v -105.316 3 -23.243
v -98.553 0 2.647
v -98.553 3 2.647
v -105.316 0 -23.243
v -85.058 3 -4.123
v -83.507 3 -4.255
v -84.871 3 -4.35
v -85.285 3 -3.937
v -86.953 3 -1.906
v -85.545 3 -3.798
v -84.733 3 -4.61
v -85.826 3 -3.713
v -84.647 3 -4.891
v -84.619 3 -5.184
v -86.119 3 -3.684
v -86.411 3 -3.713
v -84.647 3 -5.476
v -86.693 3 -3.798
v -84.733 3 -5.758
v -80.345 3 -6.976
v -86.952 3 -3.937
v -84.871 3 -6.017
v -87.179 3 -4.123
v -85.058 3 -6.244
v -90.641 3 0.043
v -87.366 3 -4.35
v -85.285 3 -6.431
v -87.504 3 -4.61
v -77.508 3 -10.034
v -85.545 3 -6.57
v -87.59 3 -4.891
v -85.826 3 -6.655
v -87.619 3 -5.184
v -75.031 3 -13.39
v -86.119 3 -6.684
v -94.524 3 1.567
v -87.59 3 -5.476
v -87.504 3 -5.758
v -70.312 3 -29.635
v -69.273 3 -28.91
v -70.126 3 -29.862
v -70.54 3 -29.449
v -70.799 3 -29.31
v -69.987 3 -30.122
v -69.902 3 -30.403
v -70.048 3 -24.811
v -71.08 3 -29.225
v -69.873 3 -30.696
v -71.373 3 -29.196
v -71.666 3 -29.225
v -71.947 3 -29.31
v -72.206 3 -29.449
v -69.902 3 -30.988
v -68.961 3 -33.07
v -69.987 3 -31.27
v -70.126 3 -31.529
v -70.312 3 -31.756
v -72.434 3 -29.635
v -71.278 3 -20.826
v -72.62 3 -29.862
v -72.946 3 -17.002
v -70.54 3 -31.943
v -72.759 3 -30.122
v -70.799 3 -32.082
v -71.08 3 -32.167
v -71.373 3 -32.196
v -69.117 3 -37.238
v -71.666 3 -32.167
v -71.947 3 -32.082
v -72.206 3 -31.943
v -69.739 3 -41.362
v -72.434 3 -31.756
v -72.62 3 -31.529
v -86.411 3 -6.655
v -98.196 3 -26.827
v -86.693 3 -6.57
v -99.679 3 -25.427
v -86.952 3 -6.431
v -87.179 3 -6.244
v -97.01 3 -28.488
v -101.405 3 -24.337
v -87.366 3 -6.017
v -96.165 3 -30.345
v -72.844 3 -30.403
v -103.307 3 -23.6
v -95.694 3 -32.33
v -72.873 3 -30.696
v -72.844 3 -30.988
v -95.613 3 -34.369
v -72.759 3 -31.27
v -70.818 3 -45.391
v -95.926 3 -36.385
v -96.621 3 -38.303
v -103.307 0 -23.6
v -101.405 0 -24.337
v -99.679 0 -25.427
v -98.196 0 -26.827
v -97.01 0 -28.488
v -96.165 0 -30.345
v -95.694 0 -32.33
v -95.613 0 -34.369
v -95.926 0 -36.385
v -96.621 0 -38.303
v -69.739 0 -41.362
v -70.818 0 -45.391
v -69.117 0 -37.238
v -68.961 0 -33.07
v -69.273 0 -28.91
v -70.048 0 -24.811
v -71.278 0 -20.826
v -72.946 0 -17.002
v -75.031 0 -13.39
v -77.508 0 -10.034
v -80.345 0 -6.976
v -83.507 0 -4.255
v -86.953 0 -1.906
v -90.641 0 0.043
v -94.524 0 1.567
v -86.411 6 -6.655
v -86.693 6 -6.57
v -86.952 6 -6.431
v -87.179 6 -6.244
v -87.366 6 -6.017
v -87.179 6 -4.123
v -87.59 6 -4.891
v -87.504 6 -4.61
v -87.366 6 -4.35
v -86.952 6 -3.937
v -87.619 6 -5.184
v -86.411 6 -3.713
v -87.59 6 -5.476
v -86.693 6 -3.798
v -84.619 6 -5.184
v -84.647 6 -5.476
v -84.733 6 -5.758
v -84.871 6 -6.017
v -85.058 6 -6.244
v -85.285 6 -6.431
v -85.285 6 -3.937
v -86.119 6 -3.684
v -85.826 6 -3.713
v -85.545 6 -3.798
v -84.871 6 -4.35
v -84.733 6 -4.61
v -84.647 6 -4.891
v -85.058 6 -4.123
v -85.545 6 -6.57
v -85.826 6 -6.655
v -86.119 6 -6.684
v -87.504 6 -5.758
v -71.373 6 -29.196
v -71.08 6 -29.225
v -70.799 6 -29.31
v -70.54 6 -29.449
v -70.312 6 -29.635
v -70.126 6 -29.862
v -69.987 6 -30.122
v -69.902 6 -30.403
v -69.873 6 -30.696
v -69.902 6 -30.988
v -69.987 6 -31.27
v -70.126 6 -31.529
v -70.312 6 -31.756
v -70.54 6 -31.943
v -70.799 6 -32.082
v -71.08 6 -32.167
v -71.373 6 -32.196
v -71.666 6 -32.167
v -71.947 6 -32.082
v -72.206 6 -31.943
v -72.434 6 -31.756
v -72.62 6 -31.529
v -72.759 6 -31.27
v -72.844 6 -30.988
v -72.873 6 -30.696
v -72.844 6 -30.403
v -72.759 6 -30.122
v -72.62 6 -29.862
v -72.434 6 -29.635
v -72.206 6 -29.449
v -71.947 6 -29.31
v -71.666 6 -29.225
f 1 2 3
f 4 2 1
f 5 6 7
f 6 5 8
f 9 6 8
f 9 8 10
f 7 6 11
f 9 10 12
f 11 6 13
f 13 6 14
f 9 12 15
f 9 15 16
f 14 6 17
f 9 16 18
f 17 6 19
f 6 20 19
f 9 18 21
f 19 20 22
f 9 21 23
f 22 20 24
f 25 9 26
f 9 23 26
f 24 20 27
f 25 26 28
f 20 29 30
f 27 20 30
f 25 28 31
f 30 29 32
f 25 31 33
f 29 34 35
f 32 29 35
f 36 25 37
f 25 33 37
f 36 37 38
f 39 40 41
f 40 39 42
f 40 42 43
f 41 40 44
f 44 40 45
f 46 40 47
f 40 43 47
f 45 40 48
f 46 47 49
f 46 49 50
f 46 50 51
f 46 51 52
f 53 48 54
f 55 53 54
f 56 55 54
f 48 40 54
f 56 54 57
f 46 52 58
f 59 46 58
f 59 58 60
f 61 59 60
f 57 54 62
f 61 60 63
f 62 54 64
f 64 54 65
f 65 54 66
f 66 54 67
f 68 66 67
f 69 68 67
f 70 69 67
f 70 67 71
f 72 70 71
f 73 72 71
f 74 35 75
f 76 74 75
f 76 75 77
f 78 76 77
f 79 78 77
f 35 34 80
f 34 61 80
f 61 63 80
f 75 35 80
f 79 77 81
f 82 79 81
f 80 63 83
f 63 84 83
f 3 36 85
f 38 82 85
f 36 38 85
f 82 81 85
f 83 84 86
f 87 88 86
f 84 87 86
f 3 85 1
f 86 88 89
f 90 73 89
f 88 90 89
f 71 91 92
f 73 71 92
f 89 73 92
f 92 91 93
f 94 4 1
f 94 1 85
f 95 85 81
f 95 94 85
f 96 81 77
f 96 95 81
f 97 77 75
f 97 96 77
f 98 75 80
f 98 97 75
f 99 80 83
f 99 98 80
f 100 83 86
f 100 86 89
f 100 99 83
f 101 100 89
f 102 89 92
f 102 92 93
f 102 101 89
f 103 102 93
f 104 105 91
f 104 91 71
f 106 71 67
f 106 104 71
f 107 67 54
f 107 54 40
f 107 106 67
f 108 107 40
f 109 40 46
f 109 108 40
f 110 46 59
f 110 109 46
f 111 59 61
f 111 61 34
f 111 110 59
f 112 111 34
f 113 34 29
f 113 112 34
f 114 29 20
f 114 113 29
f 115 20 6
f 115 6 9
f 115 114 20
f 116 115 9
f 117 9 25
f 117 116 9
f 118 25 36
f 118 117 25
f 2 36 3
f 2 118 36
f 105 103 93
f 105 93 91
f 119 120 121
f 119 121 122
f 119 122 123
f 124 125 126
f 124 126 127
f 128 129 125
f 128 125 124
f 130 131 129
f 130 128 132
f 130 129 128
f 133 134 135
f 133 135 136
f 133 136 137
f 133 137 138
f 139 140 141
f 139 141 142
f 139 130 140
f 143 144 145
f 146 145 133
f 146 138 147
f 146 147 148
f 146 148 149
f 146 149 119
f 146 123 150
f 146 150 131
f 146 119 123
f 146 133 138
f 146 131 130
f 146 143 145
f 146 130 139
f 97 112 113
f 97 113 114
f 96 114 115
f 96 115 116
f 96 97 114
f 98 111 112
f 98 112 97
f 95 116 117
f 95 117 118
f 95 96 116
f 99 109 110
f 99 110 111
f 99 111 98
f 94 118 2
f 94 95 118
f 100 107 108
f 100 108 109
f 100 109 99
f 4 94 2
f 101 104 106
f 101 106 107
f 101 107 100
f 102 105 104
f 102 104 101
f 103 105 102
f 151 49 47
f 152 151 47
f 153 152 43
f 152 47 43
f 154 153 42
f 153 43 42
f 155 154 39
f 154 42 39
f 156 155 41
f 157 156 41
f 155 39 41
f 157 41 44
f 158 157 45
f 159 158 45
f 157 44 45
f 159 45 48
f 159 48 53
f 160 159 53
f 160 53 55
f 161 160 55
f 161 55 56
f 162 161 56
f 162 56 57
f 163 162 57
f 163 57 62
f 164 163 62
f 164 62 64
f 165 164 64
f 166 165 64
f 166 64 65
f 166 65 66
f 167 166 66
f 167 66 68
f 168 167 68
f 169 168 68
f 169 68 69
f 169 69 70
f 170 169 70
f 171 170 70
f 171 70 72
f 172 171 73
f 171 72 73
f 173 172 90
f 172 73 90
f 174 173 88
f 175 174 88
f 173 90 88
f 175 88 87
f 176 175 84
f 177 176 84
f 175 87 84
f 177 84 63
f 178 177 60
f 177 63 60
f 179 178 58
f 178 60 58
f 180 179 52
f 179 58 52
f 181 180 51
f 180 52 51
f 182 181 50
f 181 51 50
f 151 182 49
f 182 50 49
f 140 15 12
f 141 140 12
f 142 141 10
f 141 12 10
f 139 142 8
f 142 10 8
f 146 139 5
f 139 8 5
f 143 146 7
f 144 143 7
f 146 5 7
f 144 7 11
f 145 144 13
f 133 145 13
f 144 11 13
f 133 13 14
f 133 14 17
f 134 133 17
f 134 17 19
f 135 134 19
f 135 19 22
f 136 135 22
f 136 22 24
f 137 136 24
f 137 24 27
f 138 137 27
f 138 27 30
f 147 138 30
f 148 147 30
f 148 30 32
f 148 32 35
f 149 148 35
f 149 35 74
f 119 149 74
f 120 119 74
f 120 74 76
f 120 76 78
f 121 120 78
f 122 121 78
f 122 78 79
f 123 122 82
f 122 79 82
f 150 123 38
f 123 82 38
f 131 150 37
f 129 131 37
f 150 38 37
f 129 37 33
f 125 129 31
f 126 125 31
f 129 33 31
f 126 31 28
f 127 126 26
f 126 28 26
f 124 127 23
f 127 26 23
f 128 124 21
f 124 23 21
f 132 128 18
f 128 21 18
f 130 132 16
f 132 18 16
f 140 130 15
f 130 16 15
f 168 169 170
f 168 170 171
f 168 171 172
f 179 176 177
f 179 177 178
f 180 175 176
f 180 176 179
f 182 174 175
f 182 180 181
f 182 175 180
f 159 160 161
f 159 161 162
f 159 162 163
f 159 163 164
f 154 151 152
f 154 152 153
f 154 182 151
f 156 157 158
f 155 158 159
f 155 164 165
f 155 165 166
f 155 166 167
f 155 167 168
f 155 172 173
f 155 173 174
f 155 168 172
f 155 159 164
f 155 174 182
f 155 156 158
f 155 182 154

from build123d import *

# Parameters (mm, degrees)
SKETCH_1_R           = 1.5
EXTRUDE_1_DEPTH      = 3
EXTRUDE_2_DEPTH      = 3
EXTRUDE_2_DEPTH_BACK = 3
SKETCH_2_R           = 1.5


with BuildPart() as part:
    # 草图1 → 凸台-拉伸1 (new body)
    with BuildSketch(Plane(origin=(0, 0, 0), x_dir=(1, 0, 0), z_dir=(0, 1, 0))):
        with BuildLine():
            Line((-96.621430383, 38.303370954), (-70.818390196, 45.39148714))
            ThreePointArc((-70.818390196, 45.39148714), (-73.937652642, 15.166954083), (-98.553234864, -2.646672965))
            Line((-98.553234864, -2.646672965), (-105.316266275, 23.243473425))
            ThreePointArc((-105.316266275, 23.243473425), (-97.009577473, 28.487536095), (-96.621430383, 38.303370954))
        make_face()
        with Locations((-86.118640655, 5.183838281)):
            Circle(SKETCH_1_R, mode=Mode.SUBTRACT)
        with Locations((-71.373114162, 30.69577881)):
            Circle(SKETCH_1_R, mode=Mode.SUBTRACT)
    extrude(amount=EXTRUDE_1_DEPTH)

    # 草图2 → 凸台-拉伸2 (add, two sides: drawn at the far end of the back side and taken through both)
    with BuildSketch(Plane(origin=(0, 3, 0), x_dir=(1, 0, 0), z_dir=(0, 1, 0)).offset(-EXTRUDE_2_DEPTH_BACK)):
        with Locations((-71.373114162, 30.69577881)):
            Circle(SKETCH_2_R)
        with Locations((-86.118640655, 5.183838281)):
            Circle(SKETCH_2_R)
    extrude(amount=EXTRUDE_2_DEPTH + EXTRUDE_2_DEPTH_BACK)


solid = part.part
